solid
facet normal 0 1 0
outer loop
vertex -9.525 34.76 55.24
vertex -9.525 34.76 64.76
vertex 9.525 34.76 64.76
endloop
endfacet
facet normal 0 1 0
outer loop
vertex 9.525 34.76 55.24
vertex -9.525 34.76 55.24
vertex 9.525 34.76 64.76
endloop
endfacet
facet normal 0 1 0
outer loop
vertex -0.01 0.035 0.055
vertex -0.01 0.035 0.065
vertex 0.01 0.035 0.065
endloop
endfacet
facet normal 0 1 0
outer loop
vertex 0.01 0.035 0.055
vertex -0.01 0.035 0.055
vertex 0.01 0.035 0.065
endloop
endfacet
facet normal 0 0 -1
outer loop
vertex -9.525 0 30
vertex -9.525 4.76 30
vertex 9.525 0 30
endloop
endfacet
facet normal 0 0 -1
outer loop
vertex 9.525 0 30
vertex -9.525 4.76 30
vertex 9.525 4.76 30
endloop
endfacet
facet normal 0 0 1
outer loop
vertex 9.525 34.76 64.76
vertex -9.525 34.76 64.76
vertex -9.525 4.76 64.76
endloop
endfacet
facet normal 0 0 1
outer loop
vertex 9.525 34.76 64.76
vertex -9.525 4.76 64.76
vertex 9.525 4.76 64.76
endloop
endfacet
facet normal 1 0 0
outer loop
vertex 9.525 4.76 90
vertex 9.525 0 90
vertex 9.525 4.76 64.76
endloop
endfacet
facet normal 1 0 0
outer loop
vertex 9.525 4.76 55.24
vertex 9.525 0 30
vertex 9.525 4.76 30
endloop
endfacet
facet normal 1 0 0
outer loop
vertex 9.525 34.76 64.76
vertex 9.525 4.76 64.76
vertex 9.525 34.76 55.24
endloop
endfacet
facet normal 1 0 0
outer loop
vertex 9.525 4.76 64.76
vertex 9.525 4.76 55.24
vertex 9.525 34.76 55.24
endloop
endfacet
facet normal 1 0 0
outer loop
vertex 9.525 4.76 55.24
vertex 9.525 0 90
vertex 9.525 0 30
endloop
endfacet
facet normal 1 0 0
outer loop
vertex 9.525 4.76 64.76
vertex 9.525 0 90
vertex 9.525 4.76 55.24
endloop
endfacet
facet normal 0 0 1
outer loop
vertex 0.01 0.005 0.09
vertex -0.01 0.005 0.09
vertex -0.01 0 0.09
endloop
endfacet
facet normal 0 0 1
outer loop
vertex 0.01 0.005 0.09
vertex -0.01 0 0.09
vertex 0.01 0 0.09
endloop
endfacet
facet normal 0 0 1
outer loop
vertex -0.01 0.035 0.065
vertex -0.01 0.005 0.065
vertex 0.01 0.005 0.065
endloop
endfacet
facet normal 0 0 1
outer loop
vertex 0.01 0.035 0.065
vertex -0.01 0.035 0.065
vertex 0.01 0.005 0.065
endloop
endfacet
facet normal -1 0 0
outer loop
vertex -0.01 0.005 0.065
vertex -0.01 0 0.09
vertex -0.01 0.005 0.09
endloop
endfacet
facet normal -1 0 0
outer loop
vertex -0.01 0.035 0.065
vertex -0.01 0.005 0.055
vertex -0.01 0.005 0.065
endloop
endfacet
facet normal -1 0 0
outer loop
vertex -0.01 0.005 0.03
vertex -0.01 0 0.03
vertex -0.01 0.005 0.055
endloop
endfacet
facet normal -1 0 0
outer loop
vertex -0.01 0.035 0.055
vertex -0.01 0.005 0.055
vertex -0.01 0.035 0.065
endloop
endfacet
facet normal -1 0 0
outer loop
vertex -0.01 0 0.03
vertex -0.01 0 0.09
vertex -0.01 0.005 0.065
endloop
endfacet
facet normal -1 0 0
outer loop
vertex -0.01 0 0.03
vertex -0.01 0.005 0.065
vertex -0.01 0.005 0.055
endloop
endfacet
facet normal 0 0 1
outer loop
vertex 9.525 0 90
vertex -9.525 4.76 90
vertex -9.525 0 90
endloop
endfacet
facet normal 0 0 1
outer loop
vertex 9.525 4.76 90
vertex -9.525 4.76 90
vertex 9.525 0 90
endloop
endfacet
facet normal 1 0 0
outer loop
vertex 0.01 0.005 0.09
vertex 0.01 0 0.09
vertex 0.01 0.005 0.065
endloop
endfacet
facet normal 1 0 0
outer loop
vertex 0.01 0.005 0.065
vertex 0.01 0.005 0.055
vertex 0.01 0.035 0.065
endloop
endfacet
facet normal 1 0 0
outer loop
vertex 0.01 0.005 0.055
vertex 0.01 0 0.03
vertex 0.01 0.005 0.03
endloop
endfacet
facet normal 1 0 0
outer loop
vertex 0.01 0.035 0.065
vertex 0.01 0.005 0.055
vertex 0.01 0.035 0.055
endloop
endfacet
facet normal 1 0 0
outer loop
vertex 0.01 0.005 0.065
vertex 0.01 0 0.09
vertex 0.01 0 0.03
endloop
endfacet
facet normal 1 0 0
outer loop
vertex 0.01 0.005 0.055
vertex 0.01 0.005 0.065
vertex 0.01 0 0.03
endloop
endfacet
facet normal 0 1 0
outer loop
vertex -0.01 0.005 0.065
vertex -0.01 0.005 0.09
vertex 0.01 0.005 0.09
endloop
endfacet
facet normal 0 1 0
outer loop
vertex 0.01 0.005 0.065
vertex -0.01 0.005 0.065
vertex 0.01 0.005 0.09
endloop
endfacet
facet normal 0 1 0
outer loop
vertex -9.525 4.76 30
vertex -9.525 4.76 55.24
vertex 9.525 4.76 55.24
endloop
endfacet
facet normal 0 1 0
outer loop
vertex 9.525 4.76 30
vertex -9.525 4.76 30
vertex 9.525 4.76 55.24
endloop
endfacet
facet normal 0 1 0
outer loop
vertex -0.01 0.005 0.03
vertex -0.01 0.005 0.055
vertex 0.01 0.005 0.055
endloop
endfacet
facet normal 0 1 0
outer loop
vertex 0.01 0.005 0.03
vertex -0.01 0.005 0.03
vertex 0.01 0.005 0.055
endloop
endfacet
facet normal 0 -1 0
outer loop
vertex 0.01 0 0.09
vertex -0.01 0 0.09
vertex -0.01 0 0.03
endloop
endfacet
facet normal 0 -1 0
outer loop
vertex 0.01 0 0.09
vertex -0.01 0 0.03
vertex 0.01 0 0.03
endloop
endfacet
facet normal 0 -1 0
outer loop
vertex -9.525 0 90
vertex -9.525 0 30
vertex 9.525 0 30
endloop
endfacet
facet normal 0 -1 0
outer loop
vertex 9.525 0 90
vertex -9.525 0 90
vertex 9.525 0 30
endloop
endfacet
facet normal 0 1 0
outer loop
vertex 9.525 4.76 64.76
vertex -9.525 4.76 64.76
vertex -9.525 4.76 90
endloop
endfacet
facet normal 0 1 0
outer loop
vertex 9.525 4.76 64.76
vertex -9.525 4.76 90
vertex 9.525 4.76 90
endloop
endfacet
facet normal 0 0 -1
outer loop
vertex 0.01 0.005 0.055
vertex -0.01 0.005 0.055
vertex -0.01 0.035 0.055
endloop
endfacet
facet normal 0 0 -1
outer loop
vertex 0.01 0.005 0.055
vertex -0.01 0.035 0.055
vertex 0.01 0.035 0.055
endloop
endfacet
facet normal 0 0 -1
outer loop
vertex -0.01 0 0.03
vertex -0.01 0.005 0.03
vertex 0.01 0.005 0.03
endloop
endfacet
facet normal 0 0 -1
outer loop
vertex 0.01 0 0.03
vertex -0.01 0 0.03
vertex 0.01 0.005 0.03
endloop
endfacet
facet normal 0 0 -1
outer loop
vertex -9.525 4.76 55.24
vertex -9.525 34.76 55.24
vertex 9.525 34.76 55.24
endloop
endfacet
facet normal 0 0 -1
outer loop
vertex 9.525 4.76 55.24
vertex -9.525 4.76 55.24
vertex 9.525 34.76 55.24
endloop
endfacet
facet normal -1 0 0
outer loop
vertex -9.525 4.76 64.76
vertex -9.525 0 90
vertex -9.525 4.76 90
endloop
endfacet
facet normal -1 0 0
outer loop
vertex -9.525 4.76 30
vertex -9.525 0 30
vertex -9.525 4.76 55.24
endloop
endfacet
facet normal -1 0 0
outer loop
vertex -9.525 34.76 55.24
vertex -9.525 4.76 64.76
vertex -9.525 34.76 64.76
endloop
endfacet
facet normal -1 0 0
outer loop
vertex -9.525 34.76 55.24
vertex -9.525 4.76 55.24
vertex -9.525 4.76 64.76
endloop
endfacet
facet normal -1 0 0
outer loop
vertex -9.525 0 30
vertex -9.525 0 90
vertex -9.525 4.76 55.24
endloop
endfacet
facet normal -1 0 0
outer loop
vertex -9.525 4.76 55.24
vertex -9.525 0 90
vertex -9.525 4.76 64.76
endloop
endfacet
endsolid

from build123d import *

# Parameters (mm, degrees)
RECTANGLE001_W          = 19.05
RECTANGLE001_H          = 4.76
EXTRUDE001_DEPTH        = 60
RECTANGLE_W             = 19.05
RECTANGLE_H             = 9.52
EXTRUDE_DEPTH           = 30
EXTRUDE_PLACEMENT_ANGLE = 90
CLONE_SCALE_SCALE       = 0.001


with BuildPart() as extrude001:
    # Rectangle001 → Extrude001 (new body)
    with BuildSketch(Plane(origin=(-9.525, 0, 0), x_dir=(1, 0, 0), z_dir=(0, 0, 1))):
        with Locations((9.525, 2.38)):
            Rectangle(RECTANGLE001_W, RECTANGLE001_H)
    extrude(amount=EXTRUDE001_DEPTH)


with BuildPart() as extrude001_1:
    # Extrude001 placement: moved
    add(extrude001.part.moved(Location((0, 0, 30))))


with BuildPart() as fusion:
    # Rectangle → Extrude (new body)
    with BuildSketch(Plane(origin=(-9.525, 0, 0), x_dir=(1, 0, 0), z_dir=(0, 0, 1))):
        with Locations((9.525, 4.76)):
            Rectangle(RECTANGLE_W, RECTANGLE_H)
    extrude(amount=EXTRUDE_DEPTH)


with BuildPart() as fusion_1:
    # Extrude placement: moved
    add(fusion.part.moved(Location((0, 34.76, 55.24))).rotate(Axis((0, 34.76, 55.24), (1, 0, 0)), EXTRUDE_PLACEMENT_ANGLE))

    # Fusion: union Extrude001
    add(extrude001_1.part)


with BuildPart() as scaled:
    # Clone base: copy of Fusion
    add(fusion_1.part)


with BuildPart() as scaled_1:
    # Clone scale: moved
    add(scaled.part.scale(CLONE_SCALE_SCALE))


solid = Compound([fusion_1.part, scaled_1.part])
